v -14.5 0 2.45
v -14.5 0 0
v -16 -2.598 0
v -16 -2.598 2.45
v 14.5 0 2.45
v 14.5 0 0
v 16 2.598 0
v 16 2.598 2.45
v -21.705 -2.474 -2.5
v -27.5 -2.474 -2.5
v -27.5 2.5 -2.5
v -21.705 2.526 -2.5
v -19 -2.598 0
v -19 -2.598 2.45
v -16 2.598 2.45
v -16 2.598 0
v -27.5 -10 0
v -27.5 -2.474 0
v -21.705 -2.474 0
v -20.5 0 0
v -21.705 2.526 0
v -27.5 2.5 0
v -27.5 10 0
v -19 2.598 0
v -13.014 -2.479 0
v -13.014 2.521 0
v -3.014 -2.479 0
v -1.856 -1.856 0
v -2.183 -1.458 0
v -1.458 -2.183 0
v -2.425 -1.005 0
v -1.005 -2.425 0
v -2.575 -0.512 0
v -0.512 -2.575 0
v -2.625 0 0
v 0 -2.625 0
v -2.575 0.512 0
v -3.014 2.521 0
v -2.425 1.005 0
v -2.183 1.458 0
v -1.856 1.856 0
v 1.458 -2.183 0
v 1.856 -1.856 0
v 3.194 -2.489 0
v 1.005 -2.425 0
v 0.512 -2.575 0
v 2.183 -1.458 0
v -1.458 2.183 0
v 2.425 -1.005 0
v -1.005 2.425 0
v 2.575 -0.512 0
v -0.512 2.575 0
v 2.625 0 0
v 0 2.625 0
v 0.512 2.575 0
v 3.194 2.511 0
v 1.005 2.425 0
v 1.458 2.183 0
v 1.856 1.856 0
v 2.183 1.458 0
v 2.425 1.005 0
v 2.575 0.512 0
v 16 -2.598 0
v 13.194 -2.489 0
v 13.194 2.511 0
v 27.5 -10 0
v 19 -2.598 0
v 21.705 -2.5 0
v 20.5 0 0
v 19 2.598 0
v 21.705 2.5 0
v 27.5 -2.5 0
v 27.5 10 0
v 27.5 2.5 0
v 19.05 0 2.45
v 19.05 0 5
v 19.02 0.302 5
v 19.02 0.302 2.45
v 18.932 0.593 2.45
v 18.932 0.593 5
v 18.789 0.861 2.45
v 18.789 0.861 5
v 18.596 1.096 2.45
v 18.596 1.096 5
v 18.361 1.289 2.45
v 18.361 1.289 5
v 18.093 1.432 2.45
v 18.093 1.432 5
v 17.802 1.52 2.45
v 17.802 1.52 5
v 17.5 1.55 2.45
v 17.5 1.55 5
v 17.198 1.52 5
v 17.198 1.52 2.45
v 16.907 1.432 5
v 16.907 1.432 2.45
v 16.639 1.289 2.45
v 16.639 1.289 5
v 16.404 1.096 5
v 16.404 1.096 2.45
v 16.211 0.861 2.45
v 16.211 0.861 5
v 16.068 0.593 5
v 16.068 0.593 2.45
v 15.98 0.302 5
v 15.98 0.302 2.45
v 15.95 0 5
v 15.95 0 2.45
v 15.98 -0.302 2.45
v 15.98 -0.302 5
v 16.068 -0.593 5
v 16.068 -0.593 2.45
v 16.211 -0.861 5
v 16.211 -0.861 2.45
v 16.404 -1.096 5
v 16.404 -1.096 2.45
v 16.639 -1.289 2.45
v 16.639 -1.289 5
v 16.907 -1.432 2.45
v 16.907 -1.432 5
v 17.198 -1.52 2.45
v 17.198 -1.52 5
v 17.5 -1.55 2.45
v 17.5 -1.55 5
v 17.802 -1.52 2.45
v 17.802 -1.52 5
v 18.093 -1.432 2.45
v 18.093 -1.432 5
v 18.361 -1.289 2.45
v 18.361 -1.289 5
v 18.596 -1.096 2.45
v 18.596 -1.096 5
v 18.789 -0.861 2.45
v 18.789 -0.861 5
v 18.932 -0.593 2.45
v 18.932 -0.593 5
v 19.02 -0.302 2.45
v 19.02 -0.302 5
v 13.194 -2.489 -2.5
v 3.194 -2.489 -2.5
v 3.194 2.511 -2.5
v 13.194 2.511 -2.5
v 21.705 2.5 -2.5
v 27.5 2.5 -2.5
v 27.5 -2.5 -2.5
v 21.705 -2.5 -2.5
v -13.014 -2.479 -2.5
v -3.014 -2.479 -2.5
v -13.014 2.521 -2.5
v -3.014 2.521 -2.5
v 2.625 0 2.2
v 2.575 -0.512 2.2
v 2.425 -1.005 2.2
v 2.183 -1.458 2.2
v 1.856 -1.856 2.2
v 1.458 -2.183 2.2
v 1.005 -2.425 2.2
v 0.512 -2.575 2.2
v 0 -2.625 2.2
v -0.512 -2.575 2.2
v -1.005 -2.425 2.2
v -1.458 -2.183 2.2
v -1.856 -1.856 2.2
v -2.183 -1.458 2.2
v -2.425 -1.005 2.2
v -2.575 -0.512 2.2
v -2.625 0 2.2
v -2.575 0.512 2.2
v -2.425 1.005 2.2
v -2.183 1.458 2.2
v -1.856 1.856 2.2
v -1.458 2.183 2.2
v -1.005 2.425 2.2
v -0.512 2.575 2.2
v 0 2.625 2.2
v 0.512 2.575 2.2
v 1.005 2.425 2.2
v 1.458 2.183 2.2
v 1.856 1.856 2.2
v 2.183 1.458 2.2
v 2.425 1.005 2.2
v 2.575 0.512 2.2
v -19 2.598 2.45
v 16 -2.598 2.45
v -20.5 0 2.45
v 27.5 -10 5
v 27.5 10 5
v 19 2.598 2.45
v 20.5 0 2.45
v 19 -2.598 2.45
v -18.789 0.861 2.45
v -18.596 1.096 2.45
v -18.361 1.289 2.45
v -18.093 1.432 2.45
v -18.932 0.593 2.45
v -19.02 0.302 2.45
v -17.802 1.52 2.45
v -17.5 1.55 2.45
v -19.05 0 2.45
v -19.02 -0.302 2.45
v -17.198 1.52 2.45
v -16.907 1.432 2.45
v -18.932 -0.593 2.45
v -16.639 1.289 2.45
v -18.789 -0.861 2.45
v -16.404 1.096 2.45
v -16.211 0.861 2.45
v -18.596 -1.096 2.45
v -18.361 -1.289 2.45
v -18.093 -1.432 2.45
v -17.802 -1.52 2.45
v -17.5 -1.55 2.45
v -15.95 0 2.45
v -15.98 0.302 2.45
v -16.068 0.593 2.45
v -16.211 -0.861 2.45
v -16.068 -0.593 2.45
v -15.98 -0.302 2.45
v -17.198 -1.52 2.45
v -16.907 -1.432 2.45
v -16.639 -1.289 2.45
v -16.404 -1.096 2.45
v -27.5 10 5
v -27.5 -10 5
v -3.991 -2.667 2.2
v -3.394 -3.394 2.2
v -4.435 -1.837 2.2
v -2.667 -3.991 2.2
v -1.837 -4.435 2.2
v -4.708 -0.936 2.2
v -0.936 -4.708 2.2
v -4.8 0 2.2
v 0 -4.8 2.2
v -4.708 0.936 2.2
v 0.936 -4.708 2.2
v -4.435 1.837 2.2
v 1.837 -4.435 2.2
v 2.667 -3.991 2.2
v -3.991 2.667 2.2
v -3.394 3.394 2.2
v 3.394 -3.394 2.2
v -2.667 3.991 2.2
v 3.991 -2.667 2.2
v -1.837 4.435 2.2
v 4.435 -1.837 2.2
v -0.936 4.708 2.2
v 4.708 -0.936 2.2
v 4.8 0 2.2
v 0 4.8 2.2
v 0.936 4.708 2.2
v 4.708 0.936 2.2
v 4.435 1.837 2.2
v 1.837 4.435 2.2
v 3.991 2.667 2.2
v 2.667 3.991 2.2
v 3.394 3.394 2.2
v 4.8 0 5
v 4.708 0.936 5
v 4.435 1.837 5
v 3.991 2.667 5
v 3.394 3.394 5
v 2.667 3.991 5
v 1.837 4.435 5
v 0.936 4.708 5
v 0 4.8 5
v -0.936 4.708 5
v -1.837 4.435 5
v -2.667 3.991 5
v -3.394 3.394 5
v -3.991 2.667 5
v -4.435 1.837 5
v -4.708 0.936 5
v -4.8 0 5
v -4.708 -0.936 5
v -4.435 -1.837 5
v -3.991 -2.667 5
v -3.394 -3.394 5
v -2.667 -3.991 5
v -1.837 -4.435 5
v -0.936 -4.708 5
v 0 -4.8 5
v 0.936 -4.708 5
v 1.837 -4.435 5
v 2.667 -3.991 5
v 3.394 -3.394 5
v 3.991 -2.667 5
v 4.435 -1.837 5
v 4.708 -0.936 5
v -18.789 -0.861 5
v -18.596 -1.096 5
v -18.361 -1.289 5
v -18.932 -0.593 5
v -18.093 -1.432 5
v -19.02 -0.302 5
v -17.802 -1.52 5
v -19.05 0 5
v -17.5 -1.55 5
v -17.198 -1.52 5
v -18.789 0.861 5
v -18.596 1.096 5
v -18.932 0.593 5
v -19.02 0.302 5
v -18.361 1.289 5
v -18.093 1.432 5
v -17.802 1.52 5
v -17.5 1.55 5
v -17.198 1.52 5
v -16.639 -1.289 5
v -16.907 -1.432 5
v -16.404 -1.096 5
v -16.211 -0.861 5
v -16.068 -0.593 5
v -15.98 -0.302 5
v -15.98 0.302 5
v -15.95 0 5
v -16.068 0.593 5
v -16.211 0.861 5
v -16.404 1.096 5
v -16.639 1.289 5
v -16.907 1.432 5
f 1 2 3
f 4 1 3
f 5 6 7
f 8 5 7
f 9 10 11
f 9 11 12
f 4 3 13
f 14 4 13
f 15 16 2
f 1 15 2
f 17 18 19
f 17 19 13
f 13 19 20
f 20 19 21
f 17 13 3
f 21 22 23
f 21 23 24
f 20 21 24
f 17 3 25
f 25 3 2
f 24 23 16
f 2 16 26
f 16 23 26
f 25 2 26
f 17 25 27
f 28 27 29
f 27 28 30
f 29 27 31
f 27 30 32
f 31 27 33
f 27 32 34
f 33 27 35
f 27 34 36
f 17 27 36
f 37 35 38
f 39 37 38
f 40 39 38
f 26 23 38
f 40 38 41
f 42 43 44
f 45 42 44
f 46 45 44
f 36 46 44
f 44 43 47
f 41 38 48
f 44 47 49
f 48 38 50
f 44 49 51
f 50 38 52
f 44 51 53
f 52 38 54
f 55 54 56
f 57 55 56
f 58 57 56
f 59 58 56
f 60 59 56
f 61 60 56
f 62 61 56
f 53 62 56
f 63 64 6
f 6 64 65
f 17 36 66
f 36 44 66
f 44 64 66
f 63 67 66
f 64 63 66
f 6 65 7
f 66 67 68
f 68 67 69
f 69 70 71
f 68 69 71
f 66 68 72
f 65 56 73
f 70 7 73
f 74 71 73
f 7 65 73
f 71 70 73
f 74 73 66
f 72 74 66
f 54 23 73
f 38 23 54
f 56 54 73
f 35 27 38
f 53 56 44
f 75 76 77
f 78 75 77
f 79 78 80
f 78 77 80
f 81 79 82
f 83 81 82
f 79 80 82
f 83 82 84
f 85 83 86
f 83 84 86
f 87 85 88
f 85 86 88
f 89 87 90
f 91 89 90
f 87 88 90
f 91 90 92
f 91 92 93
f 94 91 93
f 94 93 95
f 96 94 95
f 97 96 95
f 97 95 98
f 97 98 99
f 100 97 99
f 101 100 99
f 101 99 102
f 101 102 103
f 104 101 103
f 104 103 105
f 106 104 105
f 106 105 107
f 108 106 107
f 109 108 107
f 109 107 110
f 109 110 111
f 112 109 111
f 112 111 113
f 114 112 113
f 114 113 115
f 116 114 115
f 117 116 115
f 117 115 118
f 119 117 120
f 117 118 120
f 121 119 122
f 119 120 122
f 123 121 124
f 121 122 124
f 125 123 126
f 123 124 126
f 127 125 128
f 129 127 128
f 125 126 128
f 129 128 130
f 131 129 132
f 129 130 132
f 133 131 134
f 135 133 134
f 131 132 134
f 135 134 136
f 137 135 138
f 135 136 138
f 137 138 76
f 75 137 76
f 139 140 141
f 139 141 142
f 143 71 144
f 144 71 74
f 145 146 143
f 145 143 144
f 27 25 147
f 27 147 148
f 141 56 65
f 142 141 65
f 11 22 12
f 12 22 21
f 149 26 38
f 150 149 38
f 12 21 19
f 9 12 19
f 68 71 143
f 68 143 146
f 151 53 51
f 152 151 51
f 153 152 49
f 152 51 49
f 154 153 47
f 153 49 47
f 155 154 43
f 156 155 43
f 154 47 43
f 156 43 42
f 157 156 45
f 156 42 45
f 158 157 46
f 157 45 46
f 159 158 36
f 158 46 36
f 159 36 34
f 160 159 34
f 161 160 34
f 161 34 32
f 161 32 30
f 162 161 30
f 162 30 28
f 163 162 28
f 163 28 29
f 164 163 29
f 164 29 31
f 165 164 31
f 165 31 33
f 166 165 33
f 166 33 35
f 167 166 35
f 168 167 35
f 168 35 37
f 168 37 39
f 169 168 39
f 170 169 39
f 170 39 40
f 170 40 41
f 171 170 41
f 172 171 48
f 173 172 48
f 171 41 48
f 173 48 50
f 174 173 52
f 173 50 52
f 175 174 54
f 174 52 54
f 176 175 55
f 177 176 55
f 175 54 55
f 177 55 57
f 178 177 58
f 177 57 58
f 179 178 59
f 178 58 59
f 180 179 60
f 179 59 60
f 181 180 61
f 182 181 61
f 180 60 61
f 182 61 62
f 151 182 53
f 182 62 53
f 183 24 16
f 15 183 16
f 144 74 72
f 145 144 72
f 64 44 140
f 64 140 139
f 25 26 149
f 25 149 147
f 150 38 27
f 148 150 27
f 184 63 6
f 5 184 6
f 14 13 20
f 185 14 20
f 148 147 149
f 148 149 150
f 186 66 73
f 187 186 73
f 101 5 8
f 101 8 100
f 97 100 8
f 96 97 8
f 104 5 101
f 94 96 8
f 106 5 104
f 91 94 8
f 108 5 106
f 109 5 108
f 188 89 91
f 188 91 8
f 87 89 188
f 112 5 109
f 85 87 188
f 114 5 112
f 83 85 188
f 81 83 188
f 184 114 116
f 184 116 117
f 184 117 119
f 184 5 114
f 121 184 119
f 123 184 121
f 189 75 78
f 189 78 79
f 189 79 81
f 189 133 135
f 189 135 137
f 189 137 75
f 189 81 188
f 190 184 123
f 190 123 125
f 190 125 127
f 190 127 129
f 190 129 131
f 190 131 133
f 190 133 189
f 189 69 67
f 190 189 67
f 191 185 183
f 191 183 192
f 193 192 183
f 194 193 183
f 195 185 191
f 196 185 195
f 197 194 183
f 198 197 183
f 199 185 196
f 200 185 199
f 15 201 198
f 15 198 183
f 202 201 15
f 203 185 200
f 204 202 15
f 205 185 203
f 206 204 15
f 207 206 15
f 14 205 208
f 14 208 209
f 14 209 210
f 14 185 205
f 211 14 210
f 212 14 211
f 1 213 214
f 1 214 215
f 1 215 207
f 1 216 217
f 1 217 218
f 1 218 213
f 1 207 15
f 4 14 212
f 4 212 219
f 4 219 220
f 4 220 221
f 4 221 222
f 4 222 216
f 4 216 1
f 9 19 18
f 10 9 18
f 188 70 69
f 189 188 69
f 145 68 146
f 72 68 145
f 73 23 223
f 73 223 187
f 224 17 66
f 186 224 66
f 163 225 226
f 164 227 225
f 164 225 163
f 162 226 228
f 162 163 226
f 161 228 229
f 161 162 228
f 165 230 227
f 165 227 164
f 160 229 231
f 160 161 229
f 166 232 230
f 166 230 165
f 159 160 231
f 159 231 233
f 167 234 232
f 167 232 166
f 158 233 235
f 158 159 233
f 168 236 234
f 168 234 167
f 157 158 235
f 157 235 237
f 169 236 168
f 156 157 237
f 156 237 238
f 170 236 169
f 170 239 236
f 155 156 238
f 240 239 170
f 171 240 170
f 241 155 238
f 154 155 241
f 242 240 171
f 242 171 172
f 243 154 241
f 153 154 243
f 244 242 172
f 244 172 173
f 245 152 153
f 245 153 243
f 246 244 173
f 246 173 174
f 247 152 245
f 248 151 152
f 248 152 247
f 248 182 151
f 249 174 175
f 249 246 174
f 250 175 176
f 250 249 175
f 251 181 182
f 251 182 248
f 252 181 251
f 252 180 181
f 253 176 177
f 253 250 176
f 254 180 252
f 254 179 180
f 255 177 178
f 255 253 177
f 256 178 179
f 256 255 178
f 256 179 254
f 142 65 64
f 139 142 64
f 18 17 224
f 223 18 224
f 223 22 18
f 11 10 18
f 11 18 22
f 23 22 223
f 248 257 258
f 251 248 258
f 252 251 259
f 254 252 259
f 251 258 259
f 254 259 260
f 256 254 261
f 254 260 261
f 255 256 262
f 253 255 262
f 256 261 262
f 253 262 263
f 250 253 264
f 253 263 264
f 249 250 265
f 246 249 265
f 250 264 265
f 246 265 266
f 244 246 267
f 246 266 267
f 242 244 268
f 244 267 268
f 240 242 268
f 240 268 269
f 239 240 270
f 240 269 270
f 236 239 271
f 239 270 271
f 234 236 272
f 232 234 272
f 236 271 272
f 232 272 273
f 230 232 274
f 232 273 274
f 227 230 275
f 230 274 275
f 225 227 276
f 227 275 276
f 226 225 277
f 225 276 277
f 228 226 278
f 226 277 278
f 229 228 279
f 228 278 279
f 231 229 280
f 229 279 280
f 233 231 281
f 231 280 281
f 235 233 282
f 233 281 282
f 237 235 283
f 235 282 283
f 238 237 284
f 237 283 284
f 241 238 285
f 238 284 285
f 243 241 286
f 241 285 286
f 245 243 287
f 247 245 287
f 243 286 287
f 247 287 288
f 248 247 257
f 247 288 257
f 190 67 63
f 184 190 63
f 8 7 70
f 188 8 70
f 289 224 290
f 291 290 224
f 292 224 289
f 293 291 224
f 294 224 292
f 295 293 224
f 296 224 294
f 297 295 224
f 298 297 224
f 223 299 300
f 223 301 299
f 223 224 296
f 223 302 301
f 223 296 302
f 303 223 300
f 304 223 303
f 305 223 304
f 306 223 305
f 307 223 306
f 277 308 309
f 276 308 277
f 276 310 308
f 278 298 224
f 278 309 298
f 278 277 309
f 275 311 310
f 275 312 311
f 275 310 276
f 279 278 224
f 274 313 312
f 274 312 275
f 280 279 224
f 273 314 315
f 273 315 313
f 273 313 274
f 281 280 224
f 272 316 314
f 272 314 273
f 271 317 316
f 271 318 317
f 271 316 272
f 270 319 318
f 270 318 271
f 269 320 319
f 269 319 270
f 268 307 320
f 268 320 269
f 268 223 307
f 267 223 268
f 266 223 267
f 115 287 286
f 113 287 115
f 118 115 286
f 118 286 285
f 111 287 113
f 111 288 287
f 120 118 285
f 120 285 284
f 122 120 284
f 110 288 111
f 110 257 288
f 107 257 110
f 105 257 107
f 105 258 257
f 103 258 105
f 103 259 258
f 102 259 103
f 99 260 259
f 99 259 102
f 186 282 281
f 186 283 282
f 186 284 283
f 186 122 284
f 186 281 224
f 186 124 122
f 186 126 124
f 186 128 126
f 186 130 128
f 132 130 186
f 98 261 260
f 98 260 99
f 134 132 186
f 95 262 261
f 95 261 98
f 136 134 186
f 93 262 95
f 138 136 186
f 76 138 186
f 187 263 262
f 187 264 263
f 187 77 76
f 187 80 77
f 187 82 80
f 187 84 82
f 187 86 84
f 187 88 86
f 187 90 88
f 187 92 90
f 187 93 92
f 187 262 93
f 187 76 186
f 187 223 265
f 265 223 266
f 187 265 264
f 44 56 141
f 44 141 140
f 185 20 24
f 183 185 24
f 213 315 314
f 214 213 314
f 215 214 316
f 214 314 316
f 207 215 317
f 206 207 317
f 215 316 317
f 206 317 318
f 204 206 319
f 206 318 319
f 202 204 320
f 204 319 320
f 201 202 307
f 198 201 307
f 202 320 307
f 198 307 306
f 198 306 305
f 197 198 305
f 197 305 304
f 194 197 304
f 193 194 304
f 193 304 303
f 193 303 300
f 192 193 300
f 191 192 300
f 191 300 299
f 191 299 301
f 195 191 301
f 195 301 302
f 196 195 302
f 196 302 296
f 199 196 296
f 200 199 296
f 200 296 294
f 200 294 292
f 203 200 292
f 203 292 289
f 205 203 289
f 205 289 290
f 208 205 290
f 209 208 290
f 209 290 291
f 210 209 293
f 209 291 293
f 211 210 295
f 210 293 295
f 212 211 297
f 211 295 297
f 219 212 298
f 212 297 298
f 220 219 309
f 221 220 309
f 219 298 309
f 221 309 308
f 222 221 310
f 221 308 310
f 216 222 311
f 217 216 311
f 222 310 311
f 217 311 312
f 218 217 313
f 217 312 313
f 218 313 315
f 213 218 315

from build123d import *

# Parameters (mm, degrees)
F0_W      = 55
F0_H      = 20
F1_DEPTH  = 5
F2_R      = 4.8
F3_DEPTH  = 2.8
F4_R      = 2.625
F5_DEPTH  = 25
F2_R_2    = 1.55
F6_DEPTH  = 25
F8_DEPTH  = 2.45
F9_W      = 10
F9_H      = 5
F9_W_2    = 5.794909
F10_DEPTH = 2.5


with BuildPart() as f1:
    # F0 (on Top) → F1 (new body)
    with BuildSketch(Plane.XY):
        Rectangle(F0_W, F0_H)
    extrude(amount=F1_DEPTH)

    # F2 (on face) → F3 (cut)
    with BuildSketch(Plane.XY.offset(5)):
        Circle(F2_R)
    extrude(amount=-F3_DEPTH, mode=Mode.SUBTRACT)

    # F4 (on face) → F5 (cut)
    with BuildSketch(Plane(origin=(0, 0, 0), x_dir=(1, 0, 0), z_dir=(0, 0, -1))):
        Circle(F4_R)
    extrude(amount=-F5_DEPTH, mode=Mode.SUBTRACT)

    # F2 (on face) → F6 (cut)
    with BuildSketch(Plane.XY.offset(5)):
        with Locations((-17.5, 0)):
            Circle(F2_R_2)
        with Locations((17.5, 0)):
            Circle(F2_R_2)
    extrude(amount=-F6_DEPTH, mode=Mode.SUBTRACT)

    # F7 (on face) → F8 (cut)
    with BuildSketch(Plane(origin=(0, 0, 0), x_dir=(1, 0, 0), z_dir=(0, 0, -1))):
        Polygon((-16, 2.598076), (-19, 2.598076), (-20.5, 0), (-19, -2.598076), (-16, -2.598076), (-14.5, 0), align=None)
        Polygon((19, 2.598076), (16, 2.598076), (14.5, 0), (16, -2.598076), (19, -2.598076), (20.5, 0), align=None)
    extrude(amount=-F8_DEPTH, mode=Mode.SUBTRACT)

    # F9 (on face) → F10 (join)
    with BuildSketch(Plane(origin=(0, 0, 0), x_dir=(1, 0, 0), z_dir=(0, 0, -1))):
        Polygon((-27.5, 2.473653), (-27.5, -2.5), (-21.705, -2.526347), (-21.705, 2.473653), align=None)
        with Locations((-8.014056, -0.021072)):
            Rectangle(F9_W, F9_H)
        with Locations((8.194137, -0.011235)):
            Rectangle(F9_W, F9_H)
        with Locations((24.602545, 0)):
            Rectangle(F9_W_2, F9_H)
    extrude(amount=F10_DEPTH)


solid = f1.part
